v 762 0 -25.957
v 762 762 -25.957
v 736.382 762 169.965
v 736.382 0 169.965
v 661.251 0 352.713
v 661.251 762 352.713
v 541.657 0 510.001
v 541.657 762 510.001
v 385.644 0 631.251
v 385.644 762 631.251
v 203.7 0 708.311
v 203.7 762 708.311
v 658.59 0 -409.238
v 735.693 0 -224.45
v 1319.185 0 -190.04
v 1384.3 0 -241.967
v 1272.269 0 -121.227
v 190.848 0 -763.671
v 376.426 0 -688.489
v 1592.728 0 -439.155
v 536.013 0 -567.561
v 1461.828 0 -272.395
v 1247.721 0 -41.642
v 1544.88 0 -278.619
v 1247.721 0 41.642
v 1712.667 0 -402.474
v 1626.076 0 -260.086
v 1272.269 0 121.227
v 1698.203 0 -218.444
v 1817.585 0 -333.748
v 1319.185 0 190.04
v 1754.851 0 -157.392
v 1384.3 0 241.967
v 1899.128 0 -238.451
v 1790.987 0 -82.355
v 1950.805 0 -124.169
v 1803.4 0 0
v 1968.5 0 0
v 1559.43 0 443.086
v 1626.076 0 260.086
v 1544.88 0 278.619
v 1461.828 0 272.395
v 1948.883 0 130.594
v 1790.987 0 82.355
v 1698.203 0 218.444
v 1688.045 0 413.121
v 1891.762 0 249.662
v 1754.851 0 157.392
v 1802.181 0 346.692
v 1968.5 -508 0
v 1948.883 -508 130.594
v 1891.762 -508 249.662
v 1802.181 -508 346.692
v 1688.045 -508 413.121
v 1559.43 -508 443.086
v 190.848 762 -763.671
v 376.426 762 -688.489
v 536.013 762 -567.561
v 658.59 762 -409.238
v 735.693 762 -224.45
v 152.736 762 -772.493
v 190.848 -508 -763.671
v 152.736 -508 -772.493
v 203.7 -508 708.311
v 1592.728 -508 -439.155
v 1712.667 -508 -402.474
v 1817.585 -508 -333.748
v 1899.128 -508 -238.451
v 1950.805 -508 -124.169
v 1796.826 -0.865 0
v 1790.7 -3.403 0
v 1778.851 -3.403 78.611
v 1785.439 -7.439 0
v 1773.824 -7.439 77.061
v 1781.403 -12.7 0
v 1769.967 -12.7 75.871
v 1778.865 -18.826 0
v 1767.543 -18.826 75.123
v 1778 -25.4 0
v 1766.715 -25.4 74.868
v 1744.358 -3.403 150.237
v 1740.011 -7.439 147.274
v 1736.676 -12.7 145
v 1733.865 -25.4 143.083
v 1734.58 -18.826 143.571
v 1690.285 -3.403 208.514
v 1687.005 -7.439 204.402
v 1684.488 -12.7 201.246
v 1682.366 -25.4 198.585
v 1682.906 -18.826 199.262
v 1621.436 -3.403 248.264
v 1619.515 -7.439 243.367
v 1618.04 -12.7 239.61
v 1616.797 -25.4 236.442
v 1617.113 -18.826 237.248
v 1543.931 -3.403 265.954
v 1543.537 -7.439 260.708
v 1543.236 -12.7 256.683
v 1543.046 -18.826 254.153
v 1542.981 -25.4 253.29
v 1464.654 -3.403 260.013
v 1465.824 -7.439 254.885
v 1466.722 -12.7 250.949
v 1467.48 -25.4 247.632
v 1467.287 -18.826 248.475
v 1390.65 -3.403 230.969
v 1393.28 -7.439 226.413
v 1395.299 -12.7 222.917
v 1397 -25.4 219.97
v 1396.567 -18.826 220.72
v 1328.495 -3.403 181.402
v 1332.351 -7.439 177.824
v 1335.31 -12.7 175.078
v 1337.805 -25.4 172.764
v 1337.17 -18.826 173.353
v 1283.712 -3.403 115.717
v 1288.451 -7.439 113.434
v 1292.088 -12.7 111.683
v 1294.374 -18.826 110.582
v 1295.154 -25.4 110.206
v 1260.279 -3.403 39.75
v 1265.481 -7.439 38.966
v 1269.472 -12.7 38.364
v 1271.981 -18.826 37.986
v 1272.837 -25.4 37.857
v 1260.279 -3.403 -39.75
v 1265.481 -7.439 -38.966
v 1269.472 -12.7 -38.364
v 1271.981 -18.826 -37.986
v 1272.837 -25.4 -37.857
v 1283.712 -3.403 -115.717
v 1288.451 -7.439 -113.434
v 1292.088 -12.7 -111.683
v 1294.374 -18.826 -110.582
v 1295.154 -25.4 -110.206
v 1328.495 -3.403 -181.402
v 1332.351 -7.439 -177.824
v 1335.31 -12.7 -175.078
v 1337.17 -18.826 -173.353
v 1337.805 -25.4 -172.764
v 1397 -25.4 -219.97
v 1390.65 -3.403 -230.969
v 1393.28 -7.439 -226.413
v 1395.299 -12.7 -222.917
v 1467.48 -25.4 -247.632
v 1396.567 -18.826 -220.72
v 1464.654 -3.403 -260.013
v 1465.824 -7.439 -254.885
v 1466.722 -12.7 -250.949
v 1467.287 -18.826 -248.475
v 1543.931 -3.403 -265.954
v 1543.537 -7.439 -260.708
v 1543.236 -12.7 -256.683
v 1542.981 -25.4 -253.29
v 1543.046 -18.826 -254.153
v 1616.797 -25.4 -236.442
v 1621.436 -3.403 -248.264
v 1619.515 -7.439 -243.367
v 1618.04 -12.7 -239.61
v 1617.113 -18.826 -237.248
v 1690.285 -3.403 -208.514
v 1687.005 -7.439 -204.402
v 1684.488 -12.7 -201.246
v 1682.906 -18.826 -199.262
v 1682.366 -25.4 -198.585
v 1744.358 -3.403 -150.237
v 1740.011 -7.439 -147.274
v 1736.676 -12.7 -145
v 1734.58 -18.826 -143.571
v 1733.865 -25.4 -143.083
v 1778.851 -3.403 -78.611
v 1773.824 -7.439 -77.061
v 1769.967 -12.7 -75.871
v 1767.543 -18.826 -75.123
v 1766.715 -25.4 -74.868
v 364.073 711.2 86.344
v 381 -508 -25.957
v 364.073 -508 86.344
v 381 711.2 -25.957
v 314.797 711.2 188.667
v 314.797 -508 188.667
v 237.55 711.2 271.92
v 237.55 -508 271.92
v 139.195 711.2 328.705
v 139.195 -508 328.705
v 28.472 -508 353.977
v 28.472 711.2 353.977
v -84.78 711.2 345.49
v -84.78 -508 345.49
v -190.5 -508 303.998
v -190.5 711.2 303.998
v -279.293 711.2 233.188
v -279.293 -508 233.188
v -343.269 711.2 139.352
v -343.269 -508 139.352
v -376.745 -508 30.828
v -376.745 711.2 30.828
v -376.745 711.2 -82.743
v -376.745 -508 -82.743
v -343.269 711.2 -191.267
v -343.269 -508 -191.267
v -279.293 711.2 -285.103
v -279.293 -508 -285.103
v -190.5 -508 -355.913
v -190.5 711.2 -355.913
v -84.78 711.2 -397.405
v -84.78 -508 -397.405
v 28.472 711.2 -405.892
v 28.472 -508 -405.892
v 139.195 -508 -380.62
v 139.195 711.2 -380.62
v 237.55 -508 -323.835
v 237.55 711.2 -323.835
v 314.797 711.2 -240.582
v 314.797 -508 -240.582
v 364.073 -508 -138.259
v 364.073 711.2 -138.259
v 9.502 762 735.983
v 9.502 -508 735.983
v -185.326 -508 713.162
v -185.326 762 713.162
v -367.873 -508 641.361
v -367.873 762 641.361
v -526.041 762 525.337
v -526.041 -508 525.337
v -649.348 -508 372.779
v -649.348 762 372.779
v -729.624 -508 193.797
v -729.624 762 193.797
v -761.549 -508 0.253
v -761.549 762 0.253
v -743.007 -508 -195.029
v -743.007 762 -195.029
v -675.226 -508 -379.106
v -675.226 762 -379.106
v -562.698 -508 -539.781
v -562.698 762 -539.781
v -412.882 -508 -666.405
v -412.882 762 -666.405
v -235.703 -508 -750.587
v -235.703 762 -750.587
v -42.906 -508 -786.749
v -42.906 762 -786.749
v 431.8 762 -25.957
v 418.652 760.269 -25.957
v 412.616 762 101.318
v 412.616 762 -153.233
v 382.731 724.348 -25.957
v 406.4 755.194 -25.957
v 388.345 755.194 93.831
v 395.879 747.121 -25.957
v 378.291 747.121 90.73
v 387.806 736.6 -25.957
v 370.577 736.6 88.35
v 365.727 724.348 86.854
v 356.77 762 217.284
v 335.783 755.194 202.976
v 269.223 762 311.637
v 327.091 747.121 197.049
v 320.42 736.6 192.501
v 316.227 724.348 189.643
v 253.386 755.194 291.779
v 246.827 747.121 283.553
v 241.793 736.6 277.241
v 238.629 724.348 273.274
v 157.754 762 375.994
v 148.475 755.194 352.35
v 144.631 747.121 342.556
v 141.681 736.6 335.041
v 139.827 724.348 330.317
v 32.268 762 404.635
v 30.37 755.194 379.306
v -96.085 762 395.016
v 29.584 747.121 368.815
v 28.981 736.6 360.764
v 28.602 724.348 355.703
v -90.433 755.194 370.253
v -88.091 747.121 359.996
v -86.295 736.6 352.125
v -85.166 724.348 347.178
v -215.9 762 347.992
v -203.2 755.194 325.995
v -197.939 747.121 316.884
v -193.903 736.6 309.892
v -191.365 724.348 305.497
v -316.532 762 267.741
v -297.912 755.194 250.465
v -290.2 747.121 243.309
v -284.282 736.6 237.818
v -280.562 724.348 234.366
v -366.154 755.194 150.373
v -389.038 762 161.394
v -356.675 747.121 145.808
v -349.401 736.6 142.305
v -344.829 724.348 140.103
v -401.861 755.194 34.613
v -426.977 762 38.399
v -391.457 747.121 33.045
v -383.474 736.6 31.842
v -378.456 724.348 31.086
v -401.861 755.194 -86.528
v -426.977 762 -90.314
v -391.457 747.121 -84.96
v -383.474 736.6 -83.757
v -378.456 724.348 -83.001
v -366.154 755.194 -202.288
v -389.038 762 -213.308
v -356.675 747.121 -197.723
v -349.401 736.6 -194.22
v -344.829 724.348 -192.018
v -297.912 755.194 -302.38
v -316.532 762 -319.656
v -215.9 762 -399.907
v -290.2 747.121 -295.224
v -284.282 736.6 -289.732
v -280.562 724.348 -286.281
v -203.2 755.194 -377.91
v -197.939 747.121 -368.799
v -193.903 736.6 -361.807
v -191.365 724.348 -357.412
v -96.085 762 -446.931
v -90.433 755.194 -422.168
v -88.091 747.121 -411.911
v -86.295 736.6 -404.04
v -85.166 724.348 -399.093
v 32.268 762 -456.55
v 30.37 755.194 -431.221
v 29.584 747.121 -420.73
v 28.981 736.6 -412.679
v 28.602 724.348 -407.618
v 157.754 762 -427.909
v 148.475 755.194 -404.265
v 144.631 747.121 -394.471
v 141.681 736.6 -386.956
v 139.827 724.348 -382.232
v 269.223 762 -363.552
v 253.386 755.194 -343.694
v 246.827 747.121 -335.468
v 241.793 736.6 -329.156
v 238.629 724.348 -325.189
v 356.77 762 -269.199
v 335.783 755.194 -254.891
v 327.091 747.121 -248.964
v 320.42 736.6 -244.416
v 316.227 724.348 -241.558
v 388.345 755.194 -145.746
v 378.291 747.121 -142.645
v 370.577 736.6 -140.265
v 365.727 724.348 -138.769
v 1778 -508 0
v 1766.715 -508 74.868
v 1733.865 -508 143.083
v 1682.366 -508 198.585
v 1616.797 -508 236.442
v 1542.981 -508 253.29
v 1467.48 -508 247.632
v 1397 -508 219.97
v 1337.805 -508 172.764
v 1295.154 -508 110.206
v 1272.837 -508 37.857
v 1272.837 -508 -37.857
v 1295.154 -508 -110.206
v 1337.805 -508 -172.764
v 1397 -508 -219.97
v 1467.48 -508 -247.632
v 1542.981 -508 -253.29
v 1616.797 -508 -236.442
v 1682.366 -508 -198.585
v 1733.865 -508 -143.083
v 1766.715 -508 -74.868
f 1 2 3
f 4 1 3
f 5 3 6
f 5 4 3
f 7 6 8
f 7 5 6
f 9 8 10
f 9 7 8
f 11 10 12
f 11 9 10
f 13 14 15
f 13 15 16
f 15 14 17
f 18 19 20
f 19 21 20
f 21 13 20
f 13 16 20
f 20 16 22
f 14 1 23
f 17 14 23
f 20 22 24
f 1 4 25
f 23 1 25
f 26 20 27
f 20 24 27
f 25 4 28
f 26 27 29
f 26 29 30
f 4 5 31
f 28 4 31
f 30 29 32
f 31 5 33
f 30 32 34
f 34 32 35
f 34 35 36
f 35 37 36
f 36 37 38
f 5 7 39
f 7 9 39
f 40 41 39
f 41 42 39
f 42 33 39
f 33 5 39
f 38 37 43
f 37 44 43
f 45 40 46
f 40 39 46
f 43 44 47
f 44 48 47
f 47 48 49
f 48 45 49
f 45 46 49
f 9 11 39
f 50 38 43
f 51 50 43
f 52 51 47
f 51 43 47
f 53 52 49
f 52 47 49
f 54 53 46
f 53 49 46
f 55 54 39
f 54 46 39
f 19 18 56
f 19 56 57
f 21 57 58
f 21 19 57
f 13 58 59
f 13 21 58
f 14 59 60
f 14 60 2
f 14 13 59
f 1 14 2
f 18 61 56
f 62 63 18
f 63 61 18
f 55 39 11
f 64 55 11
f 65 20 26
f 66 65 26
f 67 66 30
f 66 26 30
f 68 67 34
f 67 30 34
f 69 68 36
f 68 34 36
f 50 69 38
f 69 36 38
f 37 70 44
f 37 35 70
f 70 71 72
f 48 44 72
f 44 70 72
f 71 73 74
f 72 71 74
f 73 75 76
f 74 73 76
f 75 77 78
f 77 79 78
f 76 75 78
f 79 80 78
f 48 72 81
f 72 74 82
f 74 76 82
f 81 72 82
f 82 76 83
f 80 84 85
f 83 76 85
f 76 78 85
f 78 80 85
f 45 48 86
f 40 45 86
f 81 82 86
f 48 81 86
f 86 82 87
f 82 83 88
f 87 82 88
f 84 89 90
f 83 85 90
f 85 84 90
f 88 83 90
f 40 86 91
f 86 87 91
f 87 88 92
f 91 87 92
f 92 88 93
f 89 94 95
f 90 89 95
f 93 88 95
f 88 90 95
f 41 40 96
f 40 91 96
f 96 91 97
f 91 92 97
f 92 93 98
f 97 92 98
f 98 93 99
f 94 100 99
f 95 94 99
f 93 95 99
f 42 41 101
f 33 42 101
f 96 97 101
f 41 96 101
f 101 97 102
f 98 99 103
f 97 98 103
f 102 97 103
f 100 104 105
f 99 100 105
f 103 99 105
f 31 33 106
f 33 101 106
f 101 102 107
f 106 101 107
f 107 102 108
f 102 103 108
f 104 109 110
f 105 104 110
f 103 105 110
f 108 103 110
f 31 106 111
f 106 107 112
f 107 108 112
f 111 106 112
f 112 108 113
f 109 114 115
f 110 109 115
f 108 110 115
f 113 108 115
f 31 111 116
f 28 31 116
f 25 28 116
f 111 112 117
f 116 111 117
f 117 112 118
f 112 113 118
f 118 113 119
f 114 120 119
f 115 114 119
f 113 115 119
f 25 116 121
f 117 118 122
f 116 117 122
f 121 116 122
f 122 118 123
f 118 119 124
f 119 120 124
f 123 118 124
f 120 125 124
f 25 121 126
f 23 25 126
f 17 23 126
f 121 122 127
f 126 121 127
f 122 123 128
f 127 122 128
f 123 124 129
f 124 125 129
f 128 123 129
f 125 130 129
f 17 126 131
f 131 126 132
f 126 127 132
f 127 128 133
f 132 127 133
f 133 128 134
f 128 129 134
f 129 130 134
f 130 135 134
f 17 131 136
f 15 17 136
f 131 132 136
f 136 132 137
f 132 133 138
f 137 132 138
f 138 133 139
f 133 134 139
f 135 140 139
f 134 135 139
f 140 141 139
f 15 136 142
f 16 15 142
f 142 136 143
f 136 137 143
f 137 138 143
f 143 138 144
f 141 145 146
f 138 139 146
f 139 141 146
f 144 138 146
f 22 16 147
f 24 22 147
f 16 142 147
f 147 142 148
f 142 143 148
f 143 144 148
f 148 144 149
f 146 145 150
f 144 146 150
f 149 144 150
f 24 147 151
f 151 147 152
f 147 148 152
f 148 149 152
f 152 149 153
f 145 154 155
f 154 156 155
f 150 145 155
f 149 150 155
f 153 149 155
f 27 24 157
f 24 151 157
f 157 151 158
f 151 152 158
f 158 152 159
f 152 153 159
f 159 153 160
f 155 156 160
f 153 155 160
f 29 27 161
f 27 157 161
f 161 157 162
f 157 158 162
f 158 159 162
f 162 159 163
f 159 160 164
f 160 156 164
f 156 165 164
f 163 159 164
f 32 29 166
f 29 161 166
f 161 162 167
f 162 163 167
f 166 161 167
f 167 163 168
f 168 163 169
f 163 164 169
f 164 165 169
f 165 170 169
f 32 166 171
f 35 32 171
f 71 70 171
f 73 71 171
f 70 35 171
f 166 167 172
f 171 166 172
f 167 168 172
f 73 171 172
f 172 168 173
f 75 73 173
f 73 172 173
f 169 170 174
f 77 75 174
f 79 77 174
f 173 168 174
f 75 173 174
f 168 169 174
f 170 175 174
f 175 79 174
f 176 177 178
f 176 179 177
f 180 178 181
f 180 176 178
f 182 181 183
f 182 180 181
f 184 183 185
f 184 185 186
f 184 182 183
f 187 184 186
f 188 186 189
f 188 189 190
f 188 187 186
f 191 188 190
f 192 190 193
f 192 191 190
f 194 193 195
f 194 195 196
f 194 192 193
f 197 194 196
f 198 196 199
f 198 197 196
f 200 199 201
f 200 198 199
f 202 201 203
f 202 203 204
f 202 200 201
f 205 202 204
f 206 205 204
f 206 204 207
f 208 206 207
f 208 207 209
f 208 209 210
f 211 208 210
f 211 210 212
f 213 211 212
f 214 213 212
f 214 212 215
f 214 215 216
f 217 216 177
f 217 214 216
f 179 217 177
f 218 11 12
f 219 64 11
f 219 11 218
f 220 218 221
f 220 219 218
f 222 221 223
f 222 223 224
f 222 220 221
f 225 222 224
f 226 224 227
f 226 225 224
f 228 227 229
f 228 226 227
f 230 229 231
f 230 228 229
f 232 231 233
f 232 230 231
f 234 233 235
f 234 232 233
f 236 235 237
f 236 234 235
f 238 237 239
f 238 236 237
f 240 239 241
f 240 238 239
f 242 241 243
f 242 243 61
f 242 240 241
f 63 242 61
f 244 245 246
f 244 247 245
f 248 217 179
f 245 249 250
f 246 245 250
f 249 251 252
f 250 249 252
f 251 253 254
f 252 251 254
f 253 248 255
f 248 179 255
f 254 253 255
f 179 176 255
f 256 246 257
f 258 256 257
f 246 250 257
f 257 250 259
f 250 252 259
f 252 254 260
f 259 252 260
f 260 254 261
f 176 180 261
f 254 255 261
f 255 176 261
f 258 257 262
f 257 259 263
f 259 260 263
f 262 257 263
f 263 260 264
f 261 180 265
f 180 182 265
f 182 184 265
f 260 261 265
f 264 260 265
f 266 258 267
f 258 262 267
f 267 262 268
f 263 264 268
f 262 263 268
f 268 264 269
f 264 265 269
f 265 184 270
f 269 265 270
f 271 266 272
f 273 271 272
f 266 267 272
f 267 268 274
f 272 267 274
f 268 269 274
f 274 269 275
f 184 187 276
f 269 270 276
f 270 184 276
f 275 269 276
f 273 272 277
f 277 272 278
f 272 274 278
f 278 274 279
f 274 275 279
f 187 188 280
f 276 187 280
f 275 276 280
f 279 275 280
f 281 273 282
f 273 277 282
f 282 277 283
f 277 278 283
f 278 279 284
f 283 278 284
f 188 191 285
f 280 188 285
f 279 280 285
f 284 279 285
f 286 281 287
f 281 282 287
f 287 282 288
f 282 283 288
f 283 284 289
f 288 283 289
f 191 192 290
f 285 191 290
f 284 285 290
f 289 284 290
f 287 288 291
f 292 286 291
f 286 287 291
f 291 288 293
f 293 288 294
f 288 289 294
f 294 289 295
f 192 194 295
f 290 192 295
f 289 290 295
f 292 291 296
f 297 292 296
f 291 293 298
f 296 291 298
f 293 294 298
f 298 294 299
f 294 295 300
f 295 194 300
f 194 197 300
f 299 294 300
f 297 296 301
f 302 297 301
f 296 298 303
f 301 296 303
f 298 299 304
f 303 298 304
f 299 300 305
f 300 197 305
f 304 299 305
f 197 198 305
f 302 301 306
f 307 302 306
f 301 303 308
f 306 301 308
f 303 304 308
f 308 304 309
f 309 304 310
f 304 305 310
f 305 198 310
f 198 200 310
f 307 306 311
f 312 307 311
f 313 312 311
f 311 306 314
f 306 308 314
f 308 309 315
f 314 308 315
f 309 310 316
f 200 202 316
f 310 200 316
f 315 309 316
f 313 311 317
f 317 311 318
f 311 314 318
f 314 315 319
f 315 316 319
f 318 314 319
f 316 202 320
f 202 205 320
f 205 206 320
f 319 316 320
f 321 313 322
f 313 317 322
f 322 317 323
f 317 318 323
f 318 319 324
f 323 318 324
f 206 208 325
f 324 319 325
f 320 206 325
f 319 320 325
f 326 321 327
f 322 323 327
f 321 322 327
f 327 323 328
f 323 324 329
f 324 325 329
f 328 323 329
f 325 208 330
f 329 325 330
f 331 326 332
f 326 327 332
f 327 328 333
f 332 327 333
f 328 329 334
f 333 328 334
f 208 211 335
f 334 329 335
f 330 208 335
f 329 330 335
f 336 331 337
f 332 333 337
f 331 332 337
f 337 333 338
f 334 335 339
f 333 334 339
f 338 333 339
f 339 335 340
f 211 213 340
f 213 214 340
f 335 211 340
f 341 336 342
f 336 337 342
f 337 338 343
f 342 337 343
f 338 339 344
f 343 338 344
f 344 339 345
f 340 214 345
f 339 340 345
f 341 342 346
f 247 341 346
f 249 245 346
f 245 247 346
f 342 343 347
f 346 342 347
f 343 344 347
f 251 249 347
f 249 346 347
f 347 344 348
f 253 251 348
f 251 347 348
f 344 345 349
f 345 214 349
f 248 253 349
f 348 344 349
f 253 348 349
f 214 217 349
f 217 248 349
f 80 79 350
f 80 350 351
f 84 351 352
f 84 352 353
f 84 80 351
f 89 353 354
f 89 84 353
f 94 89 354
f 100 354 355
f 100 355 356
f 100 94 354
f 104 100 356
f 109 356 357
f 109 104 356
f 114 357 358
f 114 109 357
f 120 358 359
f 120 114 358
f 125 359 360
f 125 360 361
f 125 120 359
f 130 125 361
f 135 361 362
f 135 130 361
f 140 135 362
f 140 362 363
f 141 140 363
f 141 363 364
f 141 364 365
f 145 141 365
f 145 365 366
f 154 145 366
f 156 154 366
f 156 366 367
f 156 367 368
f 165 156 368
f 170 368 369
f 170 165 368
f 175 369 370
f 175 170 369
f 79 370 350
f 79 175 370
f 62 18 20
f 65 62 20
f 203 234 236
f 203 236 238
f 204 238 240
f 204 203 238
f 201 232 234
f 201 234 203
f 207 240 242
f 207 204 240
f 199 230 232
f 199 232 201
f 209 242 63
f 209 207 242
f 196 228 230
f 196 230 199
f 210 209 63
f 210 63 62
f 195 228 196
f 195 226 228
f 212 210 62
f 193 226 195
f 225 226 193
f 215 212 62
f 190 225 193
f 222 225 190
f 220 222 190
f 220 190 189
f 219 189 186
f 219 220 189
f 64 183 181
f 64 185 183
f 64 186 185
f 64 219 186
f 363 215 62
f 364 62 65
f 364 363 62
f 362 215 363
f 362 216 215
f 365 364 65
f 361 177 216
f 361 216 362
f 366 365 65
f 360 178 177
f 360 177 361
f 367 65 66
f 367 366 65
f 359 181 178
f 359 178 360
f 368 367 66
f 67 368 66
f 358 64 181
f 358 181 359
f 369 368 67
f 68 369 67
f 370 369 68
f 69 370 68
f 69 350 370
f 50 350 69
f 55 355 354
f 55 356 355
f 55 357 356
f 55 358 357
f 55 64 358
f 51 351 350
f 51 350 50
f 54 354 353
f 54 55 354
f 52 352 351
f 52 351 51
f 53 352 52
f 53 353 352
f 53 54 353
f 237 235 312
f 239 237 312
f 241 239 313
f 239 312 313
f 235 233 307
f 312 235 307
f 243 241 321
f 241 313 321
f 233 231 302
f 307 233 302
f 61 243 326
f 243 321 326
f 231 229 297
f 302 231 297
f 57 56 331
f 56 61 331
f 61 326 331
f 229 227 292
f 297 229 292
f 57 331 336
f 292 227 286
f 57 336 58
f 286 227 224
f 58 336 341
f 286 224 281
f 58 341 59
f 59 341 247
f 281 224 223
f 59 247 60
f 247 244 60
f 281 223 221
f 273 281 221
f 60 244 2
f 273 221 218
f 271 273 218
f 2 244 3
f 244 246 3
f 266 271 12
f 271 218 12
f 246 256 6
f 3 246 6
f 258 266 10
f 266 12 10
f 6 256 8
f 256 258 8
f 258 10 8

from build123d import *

# Parameters (mm, degrees)
F0_R     = 381
F0_R_2   = 254
F1_DEPTH = 508
F2_DEPTH = 762
F3_R     = 50.8
F4_R     = 25.4


with BuildPart() as f1:
    # F0 (on Front) → F1 (new body)
    with BuildSketch(Plane.XZ):
        with BuildLine():
            ThreePointArc((190.848011, -763.670872), (602.523935, -492.443187), (762, -25.957488))
            ThreePointArc((762, -25.957488), (606.573772, 435.249905), (203.700106, 708.311037))
            ThreePointArc((203.700106, 708.311037), (-761.549103, 0.252512), (152.735719, -772.493355))
            Line((152.735719, -772.493355), (190.848011, -763.670872))
        make_face()
        with Locations((0, -25.957488)):
            Circle(F0_R, mode=Mode.SUBTRACT)
        with BuildLine():
            ThreePointArc((203.700106, 708.311037), (606.573772, 435.249905), (762, -25.957488))
            ThreePointArc((762, -25.957488), (602.523935, -492.443187), (190.848011, -763.670872))
            Line((190.848011, -763.670872), (1592.727674, -439.154593))
            ThreePointArc((1592.727674, -439.154593), (1079.816248, -16.764383), (1559.430162, 443.085718))
            Line((1559.430162, 443.085718), (203.700106, 708.311037))
        make_face()
        with BuildLine():
            ThreePointArc((1968.5, 0), (1850.595282, 301.522423), (1559.430162, 443.085718))
            ThreePointArc((1559.430162, 443.085718), (1079.816248, -16.764383), (1592.727674, -439.154593))
            ThreePointArc((1592.727674, -439.154593), (1861.734882, -288.99031), (1968.5, 0))
        make_face()
        with Locations((1524, 0)):
            Circle(F0_R_2, mode=Mode.SUBTRACT)
    extrude(amount=F1_DEPTH)

    # F0 (on Front) → F2 (join)
    with BuildSketch(Plane.XZ):
        with BuildLine():
            ThreePointArc((190.848011, -763.670872), (602.523935, -492.443187), (762, -25.957488))
            ThreePointArc((762, -25.957488), (606.573772, 435.249905), (203.700106, 708.311037))
            ThreePointArc((203.700106, 708.311037), (-761.549103, 0.252512), (152.735719, -772.493355))
            Line((152.735719, -772.493355), (190.848011, -763.670872))
        make_face()
        with Locations((0, -25.957488)):
            Circle(F0_R, mode=Mode.SUBTRACT)
    extrude(amount=-F2_DEPTH)

    # F3
    f3_edges = [f1.edges().sort_by_distance(p)[0] for p in [
        (-381, 762, -25.957488),
    ]]
    fillet(f3_edges, radius=F3_R)

    # F4
    f4_edges = [f1.edges().sort_by_distance(p)[0] for p in [
        (1270, 0, 0),
    ]]
    fillet(f4_edges, radius=F4_R)


solid = f1.part
